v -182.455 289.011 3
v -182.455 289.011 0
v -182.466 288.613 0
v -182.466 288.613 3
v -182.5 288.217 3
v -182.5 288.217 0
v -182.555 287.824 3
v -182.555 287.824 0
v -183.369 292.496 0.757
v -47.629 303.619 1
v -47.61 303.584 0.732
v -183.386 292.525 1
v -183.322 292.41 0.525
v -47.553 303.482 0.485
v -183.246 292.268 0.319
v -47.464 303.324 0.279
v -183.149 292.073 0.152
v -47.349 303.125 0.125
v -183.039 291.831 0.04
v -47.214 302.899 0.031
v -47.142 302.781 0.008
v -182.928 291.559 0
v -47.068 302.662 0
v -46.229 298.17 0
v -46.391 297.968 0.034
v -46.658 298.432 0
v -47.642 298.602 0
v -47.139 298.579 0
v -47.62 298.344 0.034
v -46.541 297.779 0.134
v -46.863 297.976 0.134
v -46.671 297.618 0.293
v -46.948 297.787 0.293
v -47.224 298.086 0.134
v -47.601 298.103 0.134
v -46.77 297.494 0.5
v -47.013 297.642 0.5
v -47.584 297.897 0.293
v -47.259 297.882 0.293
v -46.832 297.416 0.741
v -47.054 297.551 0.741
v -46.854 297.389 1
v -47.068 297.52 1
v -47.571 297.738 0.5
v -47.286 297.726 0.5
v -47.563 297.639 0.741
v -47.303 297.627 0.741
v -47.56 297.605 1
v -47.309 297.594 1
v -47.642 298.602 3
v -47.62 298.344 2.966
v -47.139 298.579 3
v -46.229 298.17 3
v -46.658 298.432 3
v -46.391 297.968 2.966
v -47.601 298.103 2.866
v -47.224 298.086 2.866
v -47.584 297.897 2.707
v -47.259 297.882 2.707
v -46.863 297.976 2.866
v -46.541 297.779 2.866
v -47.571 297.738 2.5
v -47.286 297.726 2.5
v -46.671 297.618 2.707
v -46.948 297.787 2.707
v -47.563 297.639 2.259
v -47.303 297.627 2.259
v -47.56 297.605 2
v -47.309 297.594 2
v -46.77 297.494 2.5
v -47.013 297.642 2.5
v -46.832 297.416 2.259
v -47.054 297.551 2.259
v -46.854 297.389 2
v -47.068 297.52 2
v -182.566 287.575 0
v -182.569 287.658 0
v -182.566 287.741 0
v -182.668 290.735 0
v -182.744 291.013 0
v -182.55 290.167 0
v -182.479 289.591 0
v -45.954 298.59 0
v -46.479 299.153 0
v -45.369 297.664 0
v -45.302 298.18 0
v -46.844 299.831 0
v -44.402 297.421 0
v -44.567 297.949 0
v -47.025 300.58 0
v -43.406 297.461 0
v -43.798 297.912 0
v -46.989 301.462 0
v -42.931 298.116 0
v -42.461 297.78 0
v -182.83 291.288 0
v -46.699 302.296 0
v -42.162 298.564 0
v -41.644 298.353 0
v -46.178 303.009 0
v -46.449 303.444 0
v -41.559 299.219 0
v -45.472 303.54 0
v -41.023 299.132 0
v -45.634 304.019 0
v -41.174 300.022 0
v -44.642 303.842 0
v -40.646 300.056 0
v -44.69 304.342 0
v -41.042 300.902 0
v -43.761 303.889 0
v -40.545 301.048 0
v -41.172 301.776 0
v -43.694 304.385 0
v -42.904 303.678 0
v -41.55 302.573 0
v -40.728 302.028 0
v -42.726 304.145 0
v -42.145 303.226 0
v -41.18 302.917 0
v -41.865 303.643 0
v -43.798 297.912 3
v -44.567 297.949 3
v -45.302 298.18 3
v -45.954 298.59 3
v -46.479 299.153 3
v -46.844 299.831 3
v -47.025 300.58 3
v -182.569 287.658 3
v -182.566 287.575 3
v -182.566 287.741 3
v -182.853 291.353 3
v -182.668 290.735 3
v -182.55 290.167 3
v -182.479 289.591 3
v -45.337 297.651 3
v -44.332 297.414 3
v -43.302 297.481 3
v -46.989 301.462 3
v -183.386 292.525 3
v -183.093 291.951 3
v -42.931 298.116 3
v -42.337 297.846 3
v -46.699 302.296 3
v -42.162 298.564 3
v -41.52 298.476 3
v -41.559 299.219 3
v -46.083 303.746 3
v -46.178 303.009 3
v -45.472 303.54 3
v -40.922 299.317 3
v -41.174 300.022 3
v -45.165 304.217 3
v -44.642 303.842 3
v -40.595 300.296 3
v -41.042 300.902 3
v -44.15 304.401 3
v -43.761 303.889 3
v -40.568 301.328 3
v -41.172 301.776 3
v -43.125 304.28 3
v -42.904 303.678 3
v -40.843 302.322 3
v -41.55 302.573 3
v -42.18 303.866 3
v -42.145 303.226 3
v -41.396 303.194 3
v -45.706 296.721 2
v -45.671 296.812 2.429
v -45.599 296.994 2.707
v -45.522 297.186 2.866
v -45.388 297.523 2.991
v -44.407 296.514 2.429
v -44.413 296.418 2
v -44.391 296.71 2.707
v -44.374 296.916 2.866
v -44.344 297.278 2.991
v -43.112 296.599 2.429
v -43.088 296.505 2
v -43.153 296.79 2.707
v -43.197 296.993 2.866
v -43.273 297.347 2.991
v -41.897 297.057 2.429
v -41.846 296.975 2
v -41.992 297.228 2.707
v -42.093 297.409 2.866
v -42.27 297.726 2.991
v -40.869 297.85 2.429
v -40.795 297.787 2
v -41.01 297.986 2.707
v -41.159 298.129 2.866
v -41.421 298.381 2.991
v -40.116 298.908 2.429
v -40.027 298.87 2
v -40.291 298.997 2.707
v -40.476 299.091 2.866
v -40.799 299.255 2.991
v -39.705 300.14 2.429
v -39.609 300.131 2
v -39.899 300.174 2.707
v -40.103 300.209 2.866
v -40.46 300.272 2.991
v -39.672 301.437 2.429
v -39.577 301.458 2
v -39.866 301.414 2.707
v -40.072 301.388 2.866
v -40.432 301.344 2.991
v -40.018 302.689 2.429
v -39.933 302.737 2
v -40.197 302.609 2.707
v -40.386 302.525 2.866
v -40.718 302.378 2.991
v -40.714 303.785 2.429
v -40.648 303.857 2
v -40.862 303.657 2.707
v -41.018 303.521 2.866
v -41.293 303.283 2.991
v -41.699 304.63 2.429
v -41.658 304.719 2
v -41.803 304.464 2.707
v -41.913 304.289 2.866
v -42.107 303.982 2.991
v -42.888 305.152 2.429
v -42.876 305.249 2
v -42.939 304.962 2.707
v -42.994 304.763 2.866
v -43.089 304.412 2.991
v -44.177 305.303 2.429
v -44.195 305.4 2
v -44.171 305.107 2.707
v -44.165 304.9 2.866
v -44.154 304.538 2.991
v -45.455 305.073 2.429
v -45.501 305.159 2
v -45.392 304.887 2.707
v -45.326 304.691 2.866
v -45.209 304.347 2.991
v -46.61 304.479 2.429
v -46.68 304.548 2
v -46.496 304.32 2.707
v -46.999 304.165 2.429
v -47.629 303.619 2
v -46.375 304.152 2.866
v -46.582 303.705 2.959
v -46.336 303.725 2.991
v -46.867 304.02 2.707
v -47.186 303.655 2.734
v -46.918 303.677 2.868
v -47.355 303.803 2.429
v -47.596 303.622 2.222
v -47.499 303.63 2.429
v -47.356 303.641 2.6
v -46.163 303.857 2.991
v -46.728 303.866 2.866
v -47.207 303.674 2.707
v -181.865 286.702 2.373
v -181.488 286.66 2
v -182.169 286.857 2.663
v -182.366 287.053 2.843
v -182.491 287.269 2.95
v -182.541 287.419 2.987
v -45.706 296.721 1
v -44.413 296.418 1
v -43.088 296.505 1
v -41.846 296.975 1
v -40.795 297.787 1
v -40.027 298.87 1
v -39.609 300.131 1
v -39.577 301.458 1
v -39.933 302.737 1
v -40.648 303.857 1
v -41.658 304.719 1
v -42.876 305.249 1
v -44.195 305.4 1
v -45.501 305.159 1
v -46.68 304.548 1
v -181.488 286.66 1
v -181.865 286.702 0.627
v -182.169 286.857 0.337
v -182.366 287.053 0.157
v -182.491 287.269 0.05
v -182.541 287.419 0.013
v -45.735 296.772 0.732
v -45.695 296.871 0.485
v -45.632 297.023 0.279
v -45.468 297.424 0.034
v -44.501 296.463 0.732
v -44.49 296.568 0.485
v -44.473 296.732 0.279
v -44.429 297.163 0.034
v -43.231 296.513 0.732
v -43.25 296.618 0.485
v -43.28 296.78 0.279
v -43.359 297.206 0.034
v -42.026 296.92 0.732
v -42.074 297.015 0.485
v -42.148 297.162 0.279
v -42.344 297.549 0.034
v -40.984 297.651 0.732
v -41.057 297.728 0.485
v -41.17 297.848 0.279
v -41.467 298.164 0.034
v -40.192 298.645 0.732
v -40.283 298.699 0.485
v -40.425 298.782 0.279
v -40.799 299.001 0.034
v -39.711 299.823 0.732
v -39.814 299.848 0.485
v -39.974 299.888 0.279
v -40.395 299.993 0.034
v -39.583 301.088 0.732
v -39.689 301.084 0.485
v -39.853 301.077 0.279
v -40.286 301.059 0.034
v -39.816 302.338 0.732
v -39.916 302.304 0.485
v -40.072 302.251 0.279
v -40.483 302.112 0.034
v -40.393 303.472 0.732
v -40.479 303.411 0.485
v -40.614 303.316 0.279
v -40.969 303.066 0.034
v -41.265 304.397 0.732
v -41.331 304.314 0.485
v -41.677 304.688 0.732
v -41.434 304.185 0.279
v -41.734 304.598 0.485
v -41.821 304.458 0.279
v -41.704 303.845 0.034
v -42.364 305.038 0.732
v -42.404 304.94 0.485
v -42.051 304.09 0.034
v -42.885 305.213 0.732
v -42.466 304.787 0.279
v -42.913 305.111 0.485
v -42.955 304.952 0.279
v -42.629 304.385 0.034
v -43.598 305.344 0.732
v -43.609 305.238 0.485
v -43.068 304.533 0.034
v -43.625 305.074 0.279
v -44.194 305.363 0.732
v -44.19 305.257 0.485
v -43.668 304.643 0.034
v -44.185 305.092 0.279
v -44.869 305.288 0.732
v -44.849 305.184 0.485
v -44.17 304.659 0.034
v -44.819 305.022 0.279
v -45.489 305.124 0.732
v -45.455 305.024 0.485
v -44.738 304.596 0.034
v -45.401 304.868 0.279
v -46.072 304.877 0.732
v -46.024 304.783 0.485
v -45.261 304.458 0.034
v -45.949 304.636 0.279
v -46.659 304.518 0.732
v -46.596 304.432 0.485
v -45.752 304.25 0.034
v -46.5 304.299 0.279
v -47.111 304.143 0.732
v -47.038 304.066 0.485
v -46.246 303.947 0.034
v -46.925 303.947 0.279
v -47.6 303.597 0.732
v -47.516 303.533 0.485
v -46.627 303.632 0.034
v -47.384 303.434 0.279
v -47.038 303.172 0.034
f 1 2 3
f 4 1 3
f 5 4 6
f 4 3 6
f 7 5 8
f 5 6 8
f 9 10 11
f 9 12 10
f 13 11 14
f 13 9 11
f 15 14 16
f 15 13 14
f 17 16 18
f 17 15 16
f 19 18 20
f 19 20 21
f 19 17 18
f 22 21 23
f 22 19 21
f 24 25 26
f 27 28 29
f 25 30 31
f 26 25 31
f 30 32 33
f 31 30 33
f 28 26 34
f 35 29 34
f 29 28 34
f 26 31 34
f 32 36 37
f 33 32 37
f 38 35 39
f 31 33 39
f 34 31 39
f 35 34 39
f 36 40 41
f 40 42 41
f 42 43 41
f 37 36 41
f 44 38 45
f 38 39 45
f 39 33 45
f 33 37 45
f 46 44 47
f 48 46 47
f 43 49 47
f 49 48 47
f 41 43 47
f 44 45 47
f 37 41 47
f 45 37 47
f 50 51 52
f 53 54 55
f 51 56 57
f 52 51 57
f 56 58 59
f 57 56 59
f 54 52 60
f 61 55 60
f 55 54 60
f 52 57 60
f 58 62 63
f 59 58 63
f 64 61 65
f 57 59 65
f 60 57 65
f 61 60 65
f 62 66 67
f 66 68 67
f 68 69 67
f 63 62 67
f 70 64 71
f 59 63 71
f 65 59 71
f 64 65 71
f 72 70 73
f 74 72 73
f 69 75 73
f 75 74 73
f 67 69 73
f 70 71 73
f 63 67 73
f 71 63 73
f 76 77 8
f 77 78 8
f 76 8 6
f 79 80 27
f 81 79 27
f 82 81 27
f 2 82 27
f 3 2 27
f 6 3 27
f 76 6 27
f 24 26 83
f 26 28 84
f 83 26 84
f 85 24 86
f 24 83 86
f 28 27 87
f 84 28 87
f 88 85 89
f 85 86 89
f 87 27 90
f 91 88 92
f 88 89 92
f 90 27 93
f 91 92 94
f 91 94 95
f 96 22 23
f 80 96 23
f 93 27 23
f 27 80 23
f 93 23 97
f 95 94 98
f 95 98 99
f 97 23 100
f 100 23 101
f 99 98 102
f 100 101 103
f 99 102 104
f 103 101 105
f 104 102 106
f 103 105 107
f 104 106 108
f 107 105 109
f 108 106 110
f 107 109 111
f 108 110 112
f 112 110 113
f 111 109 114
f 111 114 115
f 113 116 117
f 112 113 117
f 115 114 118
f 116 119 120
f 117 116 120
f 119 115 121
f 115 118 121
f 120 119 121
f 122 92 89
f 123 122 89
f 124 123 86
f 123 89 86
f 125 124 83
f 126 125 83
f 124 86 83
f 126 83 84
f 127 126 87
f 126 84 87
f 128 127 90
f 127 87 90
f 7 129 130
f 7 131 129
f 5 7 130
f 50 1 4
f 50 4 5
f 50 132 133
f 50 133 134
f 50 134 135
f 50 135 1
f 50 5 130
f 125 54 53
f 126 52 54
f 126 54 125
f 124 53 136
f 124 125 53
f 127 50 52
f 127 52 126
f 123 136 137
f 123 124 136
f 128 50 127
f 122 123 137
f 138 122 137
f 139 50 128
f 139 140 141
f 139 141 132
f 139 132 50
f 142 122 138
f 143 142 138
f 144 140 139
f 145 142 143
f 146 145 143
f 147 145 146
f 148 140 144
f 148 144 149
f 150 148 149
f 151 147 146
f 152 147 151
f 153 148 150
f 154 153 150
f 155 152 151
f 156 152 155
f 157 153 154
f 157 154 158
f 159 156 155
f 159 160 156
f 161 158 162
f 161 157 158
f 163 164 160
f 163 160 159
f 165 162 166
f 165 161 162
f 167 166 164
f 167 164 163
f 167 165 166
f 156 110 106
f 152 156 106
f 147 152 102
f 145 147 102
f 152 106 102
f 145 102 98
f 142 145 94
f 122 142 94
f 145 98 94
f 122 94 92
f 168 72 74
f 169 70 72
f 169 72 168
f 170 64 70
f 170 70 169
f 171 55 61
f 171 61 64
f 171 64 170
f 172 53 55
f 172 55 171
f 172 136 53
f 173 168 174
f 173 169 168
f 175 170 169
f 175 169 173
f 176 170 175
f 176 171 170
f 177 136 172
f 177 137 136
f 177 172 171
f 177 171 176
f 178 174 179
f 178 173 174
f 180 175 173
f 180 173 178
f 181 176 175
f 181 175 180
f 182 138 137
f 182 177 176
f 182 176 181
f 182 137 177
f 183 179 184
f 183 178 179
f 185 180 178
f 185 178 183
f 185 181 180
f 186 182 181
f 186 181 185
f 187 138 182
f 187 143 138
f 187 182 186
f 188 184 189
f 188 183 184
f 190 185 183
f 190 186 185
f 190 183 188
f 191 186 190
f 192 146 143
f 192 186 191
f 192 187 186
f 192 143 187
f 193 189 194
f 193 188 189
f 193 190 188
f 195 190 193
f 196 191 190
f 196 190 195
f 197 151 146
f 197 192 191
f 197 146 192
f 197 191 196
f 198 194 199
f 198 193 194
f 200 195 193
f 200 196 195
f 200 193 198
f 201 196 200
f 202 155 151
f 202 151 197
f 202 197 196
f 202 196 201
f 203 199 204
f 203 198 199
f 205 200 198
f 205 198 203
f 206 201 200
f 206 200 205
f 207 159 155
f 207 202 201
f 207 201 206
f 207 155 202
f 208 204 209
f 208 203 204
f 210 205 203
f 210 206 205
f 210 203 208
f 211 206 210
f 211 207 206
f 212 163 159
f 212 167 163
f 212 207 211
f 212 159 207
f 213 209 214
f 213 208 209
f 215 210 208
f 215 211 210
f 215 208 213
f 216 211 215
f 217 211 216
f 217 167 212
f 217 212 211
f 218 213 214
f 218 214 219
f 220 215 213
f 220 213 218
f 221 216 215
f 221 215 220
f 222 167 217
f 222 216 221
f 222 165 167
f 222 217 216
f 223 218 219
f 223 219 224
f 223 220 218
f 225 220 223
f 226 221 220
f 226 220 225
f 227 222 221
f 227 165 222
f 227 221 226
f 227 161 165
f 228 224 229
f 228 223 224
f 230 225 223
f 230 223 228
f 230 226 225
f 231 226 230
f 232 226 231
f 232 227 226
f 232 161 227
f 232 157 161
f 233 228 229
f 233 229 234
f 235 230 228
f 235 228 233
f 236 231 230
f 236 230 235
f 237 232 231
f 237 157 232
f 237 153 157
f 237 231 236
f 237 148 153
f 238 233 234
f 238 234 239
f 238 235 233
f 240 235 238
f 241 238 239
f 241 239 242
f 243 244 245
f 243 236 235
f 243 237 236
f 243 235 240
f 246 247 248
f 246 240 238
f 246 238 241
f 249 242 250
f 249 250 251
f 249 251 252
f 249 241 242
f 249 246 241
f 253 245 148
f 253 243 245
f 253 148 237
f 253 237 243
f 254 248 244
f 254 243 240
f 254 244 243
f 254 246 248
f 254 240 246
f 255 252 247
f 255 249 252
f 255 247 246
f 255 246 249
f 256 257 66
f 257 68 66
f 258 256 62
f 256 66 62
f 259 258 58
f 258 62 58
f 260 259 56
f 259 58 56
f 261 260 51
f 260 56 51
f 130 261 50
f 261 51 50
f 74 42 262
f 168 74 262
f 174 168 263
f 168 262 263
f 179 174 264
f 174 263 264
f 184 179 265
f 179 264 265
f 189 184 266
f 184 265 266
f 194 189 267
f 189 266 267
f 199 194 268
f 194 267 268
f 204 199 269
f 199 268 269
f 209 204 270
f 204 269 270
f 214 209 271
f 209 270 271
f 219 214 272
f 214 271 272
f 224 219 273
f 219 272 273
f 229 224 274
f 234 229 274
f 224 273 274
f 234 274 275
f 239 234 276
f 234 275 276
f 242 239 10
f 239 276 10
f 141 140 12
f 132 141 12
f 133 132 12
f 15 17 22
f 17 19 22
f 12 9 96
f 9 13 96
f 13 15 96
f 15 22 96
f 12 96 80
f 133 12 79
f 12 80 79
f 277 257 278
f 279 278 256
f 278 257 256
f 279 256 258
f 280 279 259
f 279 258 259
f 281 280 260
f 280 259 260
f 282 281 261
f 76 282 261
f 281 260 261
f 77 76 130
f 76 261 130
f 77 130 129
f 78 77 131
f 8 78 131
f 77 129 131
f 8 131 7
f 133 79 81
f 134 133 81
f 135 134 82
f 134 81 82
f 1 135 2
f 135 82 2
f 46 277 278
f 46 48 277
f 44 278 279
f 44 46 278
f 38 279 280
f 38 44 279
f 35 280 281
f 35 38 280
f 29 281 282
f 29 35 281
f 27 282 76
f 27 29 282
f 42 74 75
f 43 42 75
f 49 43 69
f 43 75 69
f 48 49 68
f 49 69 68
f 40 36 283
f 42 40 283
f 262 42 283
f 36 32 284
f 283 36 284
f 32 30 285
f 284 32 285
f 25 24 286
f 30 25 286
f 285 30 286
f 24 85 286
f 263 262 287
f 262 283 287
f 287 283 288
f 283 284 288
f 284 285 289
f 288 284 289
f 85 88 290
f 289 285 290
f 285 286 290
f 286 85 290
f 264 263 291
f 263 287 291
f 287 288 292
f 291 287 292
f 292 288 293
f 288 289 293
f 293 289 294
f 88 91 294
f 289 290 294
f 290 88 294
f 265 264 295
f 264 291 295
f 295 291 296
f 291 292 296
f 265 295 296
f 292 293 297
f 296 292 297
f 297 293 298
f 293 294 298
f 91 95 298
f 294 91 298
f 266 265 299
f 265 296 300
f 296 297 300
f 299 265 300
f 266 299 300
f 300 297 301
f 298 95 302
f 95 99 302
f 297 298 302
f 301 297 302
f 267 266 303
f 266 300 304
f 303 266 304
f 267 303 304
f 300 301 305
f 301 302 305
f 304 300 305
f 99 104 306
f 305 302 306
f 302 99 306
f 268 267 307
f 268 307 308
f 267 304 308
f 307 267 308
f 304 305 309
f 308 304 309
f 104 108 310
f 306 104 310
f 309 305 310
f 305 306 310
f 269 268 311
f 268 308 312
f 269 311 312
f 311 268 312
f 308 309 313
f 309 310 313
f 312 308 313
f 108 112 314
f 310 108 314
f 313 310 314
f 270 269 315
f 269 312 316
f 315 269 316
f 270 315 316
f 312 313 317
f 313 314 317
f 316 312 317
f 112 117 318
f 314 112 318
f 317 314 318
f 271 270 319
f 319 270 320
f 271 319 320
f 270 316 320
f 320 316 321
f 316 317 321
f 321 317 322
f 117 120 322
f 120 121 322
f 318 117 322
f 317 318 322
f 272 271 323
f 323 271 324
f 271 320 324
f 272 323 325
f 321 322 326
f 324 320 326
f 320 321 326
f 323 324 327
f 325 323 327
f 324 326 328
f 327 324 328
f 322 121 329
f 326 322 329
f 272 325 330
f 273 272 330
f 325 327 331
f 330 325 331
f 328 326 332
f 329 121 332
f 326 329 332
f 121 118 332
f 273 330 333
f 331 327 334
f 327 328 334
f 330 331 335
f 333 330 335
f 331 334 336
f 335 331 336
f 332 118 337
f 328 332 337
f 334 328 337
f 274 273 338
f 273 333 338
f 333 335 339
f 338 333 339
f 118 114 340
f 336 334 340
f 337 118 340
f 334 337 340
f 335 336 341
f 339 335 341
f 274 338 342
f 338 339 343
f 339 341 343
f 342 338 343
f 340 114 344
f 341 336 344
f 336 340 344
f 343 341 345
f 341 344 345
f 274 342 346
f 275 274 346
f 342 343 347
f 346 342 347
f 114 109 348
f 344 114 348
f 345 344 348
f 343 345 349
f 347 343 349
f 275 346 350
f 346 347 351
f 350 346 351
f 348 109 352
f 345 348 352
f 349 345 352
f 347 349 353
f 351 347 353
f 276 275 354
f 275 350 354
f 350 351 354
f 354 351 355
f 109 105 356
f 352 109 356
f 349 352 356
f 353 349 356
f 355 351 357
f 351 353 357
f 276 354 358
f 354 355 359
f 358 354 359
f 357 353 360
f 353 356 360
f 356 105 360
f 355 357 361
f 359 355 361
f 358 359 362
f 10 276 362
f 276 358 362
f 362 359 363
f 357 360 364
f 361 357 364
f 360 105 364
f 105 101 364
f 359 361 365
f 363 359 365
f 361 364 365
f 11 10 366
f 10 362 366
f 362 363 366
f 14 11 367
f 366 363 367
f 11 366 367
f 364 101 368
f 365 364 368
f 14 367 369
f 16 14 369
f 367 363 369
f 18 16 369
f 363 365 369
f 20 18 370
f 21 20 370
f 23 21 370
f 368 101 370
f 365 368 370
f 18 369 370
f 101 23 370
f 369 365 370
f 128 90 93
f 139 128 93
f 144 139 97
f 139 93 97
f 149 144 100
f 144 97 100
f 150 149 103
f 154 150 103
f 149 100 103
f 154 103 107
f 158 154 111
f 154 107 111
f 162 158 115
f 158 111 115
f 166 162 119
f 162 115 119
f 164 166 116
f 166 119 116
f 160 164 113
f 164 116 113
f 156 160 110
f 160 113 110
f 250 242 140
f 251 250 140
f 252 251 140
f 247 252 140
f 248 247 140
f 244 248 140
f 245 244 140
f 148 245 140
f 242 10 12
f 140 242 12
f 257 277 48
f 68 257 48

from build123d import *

# Parameters (mm, degrees)
BOSS_EXTRUDE1_DEPTH = 3
FILLET1_R           = 1


with BuildPart() as part:
    # Sketch3 → Boss-Extrude1 (new body)
    with BuildSketch(Plane.XY):
        with BuildLine():
            Line((-47.629341679, 303.619173128), (-183.385792378, 292.525025508))
            ThreePointArc((-183.385792378, 292.525025508), (-182.965818895, 291.654682353), (-182.667892931, 290.735380959))
            ThreePointArc((-182.667892931, 290.735380959), (-182.508640247, 289.879573849), (-182.455288816, 289.010712035))
            ThreePointArc((-182.455288816, 289.010712035), (-182.566613094, 287.758202235), (-182.897095731, 286.54496066))
            Line((-182.897095731, 286.54496066), (-47.140645032, 297.63910828))
            ThreePointArc((-47.140645032, 297.63910828), (-39.556986842, 301.268852919), (-47.629341679, 303.619173128))
        make_face()
        with BuildLine():
            ThreePointArc((-41.042035478, 300.902330434), (-41.836015876, 298.869234884), (-43.797687155, 297.91229801))
            ThreePointArc((-43.797687155, 297.91229801), (-45.953531927, 298.590149359), (-47.024676985, 300.580073327))
            ThreePointArc((-47.024676985, 300.580073327), (-44.203397618, 303.897987668), (-41.042035478, 300.902330434))
        make_face(mode=Mode.SUBTRACT)
    extrude(amount=BOSS_EXTRUDE1_DEPTH)

    # Fillet1
    fillet1_edges = [part.edges().sort_by_distance(p)[0] for p in [
        (-47.140645032, 297.63910828, 1.5),
        (-182.897095731, 286.54496066, 1.5),
        (-115.018870382, 292.09203447, 3),
        (-39.556986842, 301.268852919, 3),
        (-115.507567028, 298.072099318, 0),
        (-39.556986842, 301.268852919, 0),
        (-115.018870382, 292.09203447, 0),
    ]]
    fillet(fillet1_edges, radius=FILLET1_R)


solid = part.part
